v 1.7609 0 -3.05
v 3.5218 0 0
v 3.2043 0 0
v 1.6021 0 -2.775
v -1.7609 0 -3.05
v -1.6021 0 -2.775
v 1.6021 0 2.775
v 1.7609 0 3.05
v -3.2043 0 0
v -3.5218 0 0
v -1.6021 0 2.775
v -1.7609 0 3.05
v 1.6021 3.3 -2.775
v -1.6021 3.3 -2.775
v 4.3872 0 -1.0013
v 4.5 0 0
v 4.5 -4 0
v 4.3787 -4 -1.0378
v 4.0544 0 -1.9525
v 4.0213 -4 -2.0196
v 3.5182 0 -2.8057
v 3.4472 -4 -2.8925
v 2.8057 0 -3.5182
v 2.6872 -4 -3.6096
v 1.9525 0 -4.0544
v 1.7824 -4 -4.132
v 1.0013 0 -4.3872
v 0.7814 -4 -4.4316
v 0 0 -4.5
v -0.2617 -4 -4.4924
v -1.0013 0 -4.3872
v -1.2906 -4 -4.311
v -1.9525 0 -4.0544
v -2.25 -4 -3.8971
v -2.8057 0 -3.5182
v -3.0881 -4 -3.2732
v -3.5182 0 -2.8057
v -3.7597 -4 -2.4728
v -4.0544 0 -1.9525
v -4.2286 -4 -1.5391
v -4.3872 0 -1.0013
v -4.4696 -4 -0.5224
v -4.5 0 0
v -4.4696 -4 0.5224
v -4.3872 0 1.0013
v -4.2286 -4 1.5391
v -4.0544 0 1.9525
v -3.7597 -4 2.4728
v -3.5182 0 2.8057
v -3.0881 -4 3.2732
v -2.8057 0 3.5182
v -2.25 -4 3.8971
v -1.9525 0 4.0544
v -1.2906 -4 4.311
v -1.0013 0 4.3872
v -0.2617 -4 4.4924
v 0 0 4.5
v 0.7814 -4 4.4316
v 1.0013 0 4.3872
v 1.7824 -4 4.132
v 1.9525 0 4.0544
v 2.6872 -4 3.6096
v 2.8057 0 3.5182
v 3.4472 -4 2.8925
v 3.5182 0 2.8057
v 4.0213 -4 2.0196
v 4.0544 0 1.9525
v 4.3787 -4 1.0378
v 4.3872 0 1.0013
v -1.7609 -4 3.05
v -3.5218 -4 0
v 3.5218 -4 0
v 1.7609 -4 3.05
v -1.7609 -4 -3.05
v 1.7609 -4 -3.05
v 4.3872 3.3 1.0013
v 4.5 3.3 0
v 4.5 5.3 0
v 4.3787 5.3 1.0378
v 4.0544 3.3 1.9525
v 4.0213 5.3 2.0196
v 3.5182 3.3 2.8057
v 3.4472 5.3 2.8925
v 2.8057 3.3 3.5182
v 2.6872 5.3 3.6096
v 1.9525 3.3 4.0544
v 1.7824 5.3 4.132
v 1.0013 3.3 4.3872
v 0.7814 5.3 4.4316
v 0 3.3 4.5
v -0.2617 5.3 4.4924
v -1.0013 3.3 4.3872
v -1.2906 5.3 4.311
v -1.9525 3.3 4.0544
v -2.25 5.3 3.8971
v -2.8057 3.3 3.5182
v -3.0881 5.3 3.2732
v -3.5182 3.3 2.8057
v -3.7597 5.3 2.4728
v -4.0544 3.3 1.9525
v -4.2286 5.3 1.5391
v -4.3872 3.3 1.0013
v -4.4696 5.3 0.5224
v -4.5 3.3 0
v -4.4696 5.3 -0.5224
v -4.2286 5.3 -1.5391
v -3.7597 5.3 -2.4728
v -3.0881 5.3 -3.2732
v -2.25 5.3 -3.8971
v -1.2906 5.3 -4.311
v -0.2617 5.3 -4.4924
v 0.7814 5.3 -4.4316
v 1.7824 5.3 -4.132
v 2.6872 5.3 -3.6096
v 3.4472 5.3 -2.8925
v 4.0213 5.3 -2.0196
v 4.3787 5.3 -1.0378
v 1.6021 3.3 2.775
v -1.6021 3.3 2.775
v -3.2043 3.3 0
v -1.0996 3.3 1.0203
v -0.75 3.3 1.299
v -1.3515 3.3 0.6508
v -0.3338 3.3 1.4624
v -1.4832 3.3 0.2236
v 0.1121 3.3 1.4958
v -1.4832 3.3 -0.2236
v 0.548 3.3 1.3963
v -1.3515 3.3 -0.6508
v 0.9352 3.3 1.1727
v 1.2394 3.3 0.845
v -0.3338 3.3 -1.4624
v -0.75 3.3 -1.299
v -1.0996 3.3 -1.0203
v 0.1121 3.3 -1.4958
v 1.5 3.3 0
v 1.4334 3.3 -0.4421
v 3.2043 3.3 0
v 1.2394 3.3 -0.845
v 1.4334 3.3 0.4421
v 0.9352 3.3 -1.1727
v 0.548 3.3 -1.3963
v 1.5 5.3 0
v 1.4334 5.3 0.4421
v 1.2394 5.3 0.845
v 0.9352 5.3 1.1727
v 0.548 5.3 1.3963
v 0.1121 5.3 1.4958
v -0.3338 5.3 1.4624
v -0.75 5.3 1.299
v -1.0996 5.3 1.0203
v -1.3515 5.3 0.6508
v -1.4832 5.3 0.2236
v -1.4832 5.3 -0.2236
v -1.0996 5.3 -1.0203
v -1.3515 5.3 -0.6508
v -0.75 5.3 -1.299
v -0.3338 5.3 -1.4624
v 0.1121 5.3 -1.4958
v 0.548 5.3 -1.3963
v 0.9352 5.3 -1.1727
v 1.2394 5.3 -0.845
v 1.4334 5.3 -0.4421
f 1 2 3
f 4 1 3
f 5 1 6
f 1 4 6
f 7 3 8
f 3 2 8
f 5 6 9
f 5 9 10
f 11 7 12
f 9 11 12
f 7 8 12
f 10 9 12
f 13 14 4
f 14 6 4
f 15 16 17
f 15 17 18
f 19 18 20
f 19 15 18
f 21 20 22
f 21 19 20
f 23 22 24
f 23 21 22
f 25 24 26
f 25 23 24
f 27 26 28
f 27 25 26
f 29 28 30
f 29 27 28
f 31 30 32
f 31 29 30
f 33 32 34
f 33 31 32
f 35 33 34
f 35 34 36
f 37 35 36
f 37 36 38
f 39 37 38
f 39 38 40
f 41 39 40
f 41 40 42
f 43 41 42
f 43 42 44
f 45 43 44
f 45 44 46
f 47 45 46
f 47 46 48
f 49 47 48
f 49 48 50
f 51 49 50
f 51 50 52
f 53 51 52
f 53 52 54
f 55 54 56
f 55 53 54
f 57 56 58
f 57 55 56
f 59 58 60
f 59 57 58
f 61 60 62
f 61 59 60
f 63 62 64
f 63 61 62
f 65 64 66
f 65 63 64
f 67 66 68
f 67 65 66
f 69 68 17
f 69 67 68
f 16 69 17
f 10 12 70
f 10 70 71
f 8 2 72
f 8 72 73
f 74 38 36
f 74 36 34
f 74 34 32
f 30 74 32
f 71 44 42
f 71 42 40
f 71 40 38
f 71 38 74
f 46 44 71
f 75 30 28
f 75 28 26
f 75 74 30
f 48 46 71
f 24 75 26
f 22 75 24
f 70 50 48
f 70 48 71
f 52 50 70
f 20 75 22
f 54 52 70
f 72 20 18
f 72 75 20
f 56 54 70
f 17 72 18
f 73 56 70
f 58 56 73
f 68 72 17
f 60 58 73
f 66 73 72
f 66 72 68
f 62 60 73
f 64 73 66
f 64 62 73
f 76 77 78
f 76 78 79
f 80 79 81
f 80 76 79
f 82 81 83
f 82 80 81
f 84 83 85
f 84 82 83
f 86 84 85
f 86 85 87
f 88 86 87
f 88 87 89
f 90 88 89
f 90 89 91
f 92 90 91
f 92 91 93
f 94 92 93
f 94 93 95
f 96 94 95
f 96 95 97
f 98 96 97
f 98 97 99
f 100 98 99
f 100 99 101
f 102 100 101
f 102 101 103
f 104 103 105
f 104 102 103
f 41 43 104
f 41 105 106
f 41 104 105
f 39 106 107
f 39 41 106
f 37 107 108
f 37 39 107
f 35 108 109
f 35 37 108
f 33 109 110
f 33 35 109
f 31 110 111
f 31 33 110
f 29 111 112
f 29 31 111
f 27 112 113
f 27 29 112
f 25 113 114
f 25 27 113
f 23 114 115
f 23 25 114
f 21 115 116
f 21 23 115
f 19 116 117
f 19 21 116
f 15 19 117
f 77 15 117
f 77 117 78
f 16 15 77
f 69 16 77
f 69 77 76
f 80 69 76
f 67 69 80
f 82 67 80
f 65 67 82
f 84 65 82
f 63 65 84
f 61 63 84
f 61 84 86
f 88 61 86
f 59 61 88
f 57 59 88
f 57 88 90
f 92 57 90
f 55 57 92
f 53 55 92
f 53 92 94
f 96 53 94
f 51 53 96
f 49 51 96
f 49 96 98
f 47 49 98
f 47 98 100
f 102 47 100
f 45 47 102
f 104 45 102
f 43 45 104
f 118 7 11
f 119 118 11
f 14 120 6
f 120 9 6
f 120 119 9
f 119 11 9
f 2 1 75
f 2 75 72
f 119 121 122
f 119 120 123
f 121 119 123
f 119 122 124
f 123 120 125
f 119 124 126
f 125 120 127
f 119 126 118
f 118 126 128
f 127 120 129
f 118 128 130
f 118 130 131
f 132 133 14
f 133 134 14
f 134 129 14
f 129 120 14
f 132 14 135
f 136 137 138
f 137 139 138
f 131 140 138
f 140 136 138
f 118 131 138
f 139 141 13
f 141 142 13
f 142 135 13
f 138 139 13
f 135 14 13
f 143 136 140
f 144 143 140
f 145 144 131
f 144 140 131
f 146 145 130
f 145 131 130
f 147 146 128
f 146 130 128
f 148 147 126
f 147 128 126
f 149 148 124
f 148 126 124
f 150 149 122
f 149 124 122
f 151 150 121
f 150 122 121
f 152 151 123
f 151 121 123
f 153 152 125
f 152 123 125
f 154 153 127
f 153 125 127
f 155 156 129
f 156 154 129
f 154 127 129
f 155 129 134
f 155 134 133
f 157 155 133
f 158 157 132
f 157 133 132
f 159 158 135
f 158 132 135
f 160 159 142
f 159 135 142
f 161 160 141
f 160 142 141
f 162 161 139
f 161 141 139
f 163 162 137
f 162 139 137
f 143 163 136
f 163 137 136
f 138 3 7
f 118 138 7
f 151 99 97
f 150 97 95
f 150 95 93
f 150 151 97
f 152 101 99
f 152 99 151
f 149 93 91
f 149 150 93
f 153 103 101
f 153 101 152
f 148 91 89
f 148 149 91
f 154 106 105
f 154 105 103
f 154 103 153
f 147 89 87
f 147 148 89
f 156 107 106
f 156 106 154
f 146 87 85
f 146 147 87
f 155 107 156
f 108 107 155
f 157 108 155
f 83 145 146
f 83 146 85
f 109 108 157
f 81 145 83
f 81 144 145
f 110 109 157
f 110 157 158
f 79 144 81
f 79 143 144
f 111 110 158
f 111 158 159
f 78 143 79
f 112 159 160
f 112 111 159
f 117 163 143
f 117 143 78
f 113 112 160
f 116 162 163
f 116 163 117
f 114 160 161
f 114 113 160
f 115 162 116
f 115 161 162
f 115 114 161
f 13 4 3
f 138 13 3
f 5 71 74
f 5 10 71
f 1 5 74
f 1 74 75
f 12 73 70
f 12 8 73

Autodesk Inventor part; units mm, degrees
ref_plane "YZ Plane" through (0, 0, 0) normal (1, 0, 0) x (0, 1, 0)
ref_plane "XZ Plane" through (0, 0, 0) normal (0, 1, 0) x (-1, 0, 0)
ref_plane "XY Plane" through (0, 0, 0) normal (0, 0, 1) x (1, 0, 0)
sketch "Sketch1" plane through (0, 0, 0) normal (0, 1, 0) x (-1, 0, 0)
  circle A0 centre (0, 0) radius 1.5
  circle A1 centre (0, 0) radius 4.5
  line L0 (-1.6021, 2.775) -> (1.6021, 2.775)
  line L1 (1.6021, 2.775) -> (3.2043, 0)
  line L2 (3.2043, 0) -> (1.6021, -2.775)
  line L3 (1.6021, -2.775) -> (-1.6021, -2.775)
  line L4 (-1.6021, -2.775) -> (-3.2043, 0)
  line L5 (-3.2043, 0) -> (-1.6021, 2.775)
  line L6 (6.3, 0) -> (-6.3, 0) projected
  dimension "d0" = 3
  dimension "d1" = 9
  dimension "d2" = 5.55
extrude "Extrusion1" add sketch "Sketch1" along normal blind 3.3 contours L6 A1 L4 L3 L2 | L1 L0 L5 L6 A1
sketch "Sketch2" plane through (0, 3.3, 0) normal (0, 1, 0) x (1, 0, 0)
  line L0 (-1.6021, -2.775) -> (-3.2043, 0) projected
  line L1 (-3.2043, 0) -> (-1.6021, 2.775) projected
  line L2 (-1.6021, 2.775) -> (1.6021, 2.775) projected
  line L3 (1.6021, 2.775) -> (3.2043, 0) projected
  line L4 (3.2043, 0) -> (1.6021, -2.775) projected
  line L5 (1.6021, -2.775) -> (-1.6021, -2.775) projected
  circle A0 centre (0, 0) radius 4.5 projected
  circle A1 centre (0, 0) radius 1.5
  dimension "d5" = 3
extrude "Extrusion2" add sketch "Sketch2" along normal blind 2 contours L0 L1 L2 L3 L4 L5 | A0
sketch "Sketch3" plane through (0, 0, 0) normal (0, -1, 0) x (1, 0, 0)
  point P0 (0, 0)
sketch "Sketch4" plane through (0, 0, 0) normal (0, -1, 0) x (1, 0, 0)
  line L0 (-3.2043, 0) -> (-1.6021, 2.775) projected
  line L1 (-1.6021, 2.775) -> (1.6021, 2.775) projected
  line L2 (1.6021, 2.775) -> (3.2043, 0) projected
  line L3 (3.2043, 0) -> (1.6021, -2.775) projected
  line L4 (1.6021, -2.775) -> (-1.6021, -2.775) projected
  line L5 (-1.6021, -2.775) -> (-3.2043, 0) projected
  circle A0 centre (0, 0) radius 4.5 projected
  line L6 (3.5218, 0) -> (1.7609, 3.05)
  line L7 (1.7609, 3.05) -> (-1.7609, 3.05)
  line L8 (-1.7609, 3.05) -> (-3.5218, 0)
  line L9 (-3.5218, 0) -> (-1.7609, -3.05)
  line L10 (-1.7609, -3.05) -> (1.7609, -3.05)
  line L11 (1.7609, -3.05) -> (3.5218, 0)
  dimension "d8" = 6.1
extrude "Extrusion3" add sketch "Sketch4" along normal blind 4 contours A0
properties part number "30_Adapter_M3_nut"
